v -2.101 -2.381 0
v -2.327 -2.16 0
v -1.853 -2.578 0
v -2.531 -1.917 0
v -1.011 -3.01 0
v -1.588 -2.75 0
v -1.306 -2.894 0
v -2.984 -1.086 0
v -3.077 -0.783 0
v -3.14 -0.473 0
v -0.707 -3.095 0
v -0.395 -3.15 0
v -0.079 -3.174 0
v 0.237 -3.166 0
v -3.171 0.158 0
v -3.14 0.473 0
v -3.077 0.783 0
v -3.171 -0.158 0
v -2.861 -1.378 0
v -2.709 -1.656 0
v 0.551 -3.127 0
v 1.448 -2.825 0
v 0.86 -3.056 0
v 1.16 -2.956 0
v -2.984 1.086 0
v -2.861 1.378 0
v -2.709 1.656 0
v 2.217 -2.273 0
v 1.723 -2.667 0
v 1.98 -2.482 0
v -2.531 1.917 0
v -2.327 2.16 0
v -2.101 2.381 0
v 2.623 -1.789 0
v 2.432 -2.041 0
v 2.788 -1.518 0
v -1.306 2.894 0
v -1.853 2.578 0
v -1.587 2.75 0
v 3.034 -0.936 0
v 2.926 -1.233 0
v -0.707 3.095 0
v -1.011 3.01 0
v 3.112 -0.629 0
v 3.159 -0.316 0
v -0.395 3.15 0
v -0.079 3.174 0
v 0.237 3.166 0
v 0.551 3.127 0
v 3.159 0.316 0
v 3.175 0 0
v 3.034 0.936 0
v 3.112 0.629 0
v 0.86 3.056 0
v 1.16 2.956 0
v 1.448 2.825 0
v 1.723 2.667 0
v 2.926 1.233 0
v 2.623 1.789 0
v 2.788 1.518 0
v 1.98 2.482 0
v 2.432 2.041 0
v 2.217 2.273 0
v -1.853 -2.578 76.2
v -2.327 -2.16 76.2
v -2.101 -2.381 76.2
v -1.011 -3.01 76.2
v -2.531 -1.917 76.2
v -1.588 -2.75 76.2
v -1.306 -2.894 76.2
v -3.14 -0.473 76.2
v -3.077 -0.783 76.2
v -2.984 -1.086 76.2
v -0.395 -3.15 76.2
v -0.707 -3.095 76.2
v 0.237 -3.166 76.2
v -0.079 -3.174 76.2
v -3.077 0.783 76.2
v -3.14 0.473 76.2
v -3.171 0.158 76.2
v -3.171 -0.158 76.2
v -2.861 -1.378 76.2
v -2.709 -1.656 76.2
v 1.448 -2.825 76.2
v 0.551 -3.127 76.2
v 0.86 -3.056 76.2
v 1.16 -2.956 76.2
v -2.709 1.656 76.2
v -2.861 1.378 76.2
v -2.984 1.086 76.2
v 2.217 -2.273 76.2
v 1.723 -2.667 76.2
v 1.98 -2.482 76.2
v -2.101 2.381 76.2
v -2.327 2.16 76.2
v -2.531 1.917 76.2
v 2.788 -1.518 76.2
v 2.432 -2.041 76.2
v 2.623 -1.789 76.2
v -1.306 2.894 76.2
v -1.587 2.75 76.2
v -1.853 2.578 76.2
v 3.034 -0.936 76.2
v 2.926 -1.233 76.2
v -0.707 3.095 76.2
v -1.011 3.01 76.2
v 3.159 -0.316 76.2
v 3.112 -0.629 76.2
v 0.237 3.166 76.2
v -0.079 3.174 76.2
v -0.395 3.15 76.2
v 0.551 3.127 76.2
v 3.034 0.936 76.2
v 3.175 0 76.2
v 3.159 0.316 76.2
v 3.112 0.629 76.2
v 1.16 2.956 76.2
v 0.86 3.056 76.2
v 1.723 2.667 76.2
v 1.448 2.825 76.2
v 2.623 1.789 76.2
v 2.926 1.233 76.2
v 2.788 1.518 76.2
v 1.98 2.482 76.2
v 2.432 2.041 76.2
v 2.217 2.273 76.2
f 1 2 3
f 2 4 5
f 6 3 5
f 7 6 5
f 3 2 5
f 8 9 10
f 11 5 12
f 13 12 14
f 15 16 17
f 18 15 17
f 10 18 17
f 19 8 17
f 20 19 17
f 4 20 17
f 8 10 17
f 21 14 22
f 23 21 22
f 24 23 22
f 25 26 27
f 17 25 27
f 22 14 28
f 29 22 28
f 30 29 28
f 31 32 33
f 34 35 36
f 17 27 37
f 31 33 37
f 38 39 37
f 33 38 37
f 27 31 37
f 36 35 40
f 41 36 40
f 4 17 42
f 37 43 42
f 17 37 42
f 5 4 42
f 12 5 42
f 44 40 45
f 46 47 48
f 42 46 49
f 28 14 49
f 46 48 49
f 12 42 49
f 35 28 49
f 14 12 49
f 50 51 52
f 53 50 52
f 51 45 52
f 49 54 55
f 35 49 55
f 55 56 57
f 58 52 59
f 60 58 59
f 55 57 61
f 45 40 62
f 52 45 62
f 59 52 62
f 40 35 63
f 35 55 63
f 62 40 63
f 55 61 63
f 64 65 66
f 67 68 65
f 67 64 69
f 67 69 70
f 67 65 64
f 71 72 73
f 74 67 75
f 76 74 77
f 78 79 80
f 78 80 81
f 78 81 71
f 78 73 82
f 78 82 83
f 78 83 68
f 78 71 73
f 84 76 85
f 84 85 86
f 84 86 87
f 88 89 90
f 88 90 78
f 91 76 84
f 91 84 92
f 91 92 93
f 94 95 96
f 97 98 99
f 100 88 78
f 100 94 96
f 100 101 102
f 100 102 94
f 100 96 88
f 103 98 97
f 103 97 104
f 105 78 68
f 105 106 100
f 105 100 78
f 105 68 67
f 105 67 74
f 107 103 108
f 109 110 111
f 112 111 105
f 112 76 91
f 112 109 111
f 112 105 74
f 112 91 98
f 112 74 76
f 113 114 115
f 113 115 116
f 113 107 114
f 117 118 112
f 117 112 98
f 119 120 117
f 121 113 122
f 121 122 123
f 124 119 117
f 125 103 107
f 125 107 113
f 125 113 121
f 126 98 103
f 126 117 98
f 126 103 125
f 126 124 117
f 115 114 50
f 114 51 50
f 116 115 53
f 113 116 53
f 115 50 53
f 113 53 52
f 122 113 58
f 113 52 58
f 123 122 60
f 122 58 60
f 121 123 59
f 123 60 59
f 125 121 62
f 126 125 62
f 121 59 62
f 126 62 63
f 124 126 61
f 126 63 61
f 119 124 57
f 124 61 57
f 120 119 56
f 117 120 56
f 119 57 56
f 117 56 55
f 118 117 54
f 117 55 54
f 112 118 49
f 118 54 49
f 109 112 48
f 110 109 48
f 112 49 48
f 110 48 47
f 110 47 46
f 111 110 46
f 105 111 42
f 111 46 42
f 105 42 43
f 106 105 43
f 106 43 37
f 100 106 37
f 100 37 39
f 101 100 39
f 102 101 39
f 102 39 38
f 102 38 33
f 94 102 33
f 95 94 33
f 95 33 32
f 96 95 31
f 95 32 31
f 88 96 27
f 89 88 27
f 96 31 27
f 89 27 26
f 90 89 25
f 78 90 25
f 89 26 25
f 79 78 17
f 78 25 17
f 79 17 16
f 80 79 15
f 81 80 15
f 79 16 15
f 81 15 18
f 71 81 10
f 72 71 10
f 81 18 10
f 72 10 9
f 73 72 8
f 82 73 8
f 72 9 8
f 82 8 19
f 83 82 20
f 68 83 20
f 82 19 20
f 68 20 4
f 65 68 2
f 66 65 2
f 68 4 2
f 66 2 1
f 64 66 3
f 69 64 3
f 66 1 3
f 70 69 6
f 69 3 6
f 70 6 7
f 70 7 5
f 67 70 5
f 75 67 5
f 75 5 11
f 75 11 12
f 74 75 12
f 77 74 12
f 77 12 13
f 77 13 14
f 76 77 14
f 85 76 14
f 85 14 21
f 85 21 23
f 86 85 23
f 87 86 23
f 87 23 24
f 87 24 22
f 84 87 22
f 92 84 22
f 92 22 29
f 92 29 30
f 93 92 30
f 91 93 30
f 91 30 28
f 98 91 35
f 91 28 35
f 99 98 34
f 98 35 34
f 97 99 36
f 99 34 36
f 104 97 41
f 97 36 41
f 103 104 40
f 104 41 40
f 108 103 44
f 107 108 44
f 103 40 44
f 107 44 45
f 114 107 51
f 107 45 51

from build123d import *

# Parameters (mm, degrees)
F0_R     = 3.175
F1_DEPTH = 76.2
F2_DEPTH = 25.4
F3_DEPTH = 25.4


with BuildPart() as f1:
    # F0 (on Top) → F1 (new body)
    with BuildSketch(Plane.XY):
        Circle(F0_R)
    extrude(amount=F1_DEPTH)

    # F2 (cut): a face of the model
    f2_faces = [f1.faces().sort_by_distance(p)[0] for p in [
        (0, 0, 76.2),
    ]]
    extrude(f2_faces, amount=-F2_DEPTH, mode=Mode.SUBTRACT)

    # F3 (add): a face of the model
    f3_faces = [f1.faces().sort_by_distance(p)[0] for p in [
        (0, 0, 50.8),
    ]]
    extrude(f3_faces, amount=F3_DEPTH)


solid = f1.part
